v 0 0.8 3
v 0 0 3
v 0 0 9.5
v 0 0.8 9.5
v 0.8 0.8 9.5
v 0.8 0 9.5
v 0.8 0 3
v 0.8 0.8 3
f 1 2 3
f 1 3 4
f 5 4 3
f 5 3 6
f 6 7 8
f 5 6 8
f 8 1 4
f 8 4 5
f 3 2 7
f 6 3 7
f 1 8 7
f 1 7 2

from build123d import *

# Parameters (mm, degrees)
SKICA1_W                 = 0.8
SKICA1_H                 = 0.8
P_IDAT_VYSUNUT_M1_DEPTH  = 17
SKICA2_W                 = 0.8
SKICA2_H                 = 0.8
ODEBRAT_VYSUNUT_M2_DEPTH = 3
SKICA3_W                 = 0.8
SKICA3_H                 = 0.8
ODEBRAT_VYSUNUT_M3_DEPTH = 7.5


with BuildPart() as part:
    # Skica1 → Přidat vysunutím1 (new body)
    with BuildSketch(Plane.XY):
        with Locations((0.4, 0.4)):
            Rectangle(SKICA1_W, SKICA1_H)
    extrude(amount=P_IDAT_VYSUNUT_M1_DEPTH)

    # Skica2 → Odebrat vysunutím2 (cut)
    with BuildSketch(Plane(origin=(0, 0, 0), x_dir=(-1, 0, 0), z_dir=(0, 0, -1))):
        with Locations((-0.4, 0.4)):
            Rectangle(SKICA2_W, SKICA2_H)
    extrude(amount=-ODEBRAT_VYSUNUT_M2_DEPTH, mode=Mode.SUBTRACT)

    # Skica3 → Odebrat vysunutím3 (cut)
    with BuildSketch(Plane.XY.offset(17)):
        with Locations((0.4, 0.4)):
            Rectangle(SKICA3_W, SKICA3_H)
    extrude(amount=-ODEBRAT_VYSUNUT_M3_DEPTH, mode=Mode.SUBTRACT)


solid = part.part
